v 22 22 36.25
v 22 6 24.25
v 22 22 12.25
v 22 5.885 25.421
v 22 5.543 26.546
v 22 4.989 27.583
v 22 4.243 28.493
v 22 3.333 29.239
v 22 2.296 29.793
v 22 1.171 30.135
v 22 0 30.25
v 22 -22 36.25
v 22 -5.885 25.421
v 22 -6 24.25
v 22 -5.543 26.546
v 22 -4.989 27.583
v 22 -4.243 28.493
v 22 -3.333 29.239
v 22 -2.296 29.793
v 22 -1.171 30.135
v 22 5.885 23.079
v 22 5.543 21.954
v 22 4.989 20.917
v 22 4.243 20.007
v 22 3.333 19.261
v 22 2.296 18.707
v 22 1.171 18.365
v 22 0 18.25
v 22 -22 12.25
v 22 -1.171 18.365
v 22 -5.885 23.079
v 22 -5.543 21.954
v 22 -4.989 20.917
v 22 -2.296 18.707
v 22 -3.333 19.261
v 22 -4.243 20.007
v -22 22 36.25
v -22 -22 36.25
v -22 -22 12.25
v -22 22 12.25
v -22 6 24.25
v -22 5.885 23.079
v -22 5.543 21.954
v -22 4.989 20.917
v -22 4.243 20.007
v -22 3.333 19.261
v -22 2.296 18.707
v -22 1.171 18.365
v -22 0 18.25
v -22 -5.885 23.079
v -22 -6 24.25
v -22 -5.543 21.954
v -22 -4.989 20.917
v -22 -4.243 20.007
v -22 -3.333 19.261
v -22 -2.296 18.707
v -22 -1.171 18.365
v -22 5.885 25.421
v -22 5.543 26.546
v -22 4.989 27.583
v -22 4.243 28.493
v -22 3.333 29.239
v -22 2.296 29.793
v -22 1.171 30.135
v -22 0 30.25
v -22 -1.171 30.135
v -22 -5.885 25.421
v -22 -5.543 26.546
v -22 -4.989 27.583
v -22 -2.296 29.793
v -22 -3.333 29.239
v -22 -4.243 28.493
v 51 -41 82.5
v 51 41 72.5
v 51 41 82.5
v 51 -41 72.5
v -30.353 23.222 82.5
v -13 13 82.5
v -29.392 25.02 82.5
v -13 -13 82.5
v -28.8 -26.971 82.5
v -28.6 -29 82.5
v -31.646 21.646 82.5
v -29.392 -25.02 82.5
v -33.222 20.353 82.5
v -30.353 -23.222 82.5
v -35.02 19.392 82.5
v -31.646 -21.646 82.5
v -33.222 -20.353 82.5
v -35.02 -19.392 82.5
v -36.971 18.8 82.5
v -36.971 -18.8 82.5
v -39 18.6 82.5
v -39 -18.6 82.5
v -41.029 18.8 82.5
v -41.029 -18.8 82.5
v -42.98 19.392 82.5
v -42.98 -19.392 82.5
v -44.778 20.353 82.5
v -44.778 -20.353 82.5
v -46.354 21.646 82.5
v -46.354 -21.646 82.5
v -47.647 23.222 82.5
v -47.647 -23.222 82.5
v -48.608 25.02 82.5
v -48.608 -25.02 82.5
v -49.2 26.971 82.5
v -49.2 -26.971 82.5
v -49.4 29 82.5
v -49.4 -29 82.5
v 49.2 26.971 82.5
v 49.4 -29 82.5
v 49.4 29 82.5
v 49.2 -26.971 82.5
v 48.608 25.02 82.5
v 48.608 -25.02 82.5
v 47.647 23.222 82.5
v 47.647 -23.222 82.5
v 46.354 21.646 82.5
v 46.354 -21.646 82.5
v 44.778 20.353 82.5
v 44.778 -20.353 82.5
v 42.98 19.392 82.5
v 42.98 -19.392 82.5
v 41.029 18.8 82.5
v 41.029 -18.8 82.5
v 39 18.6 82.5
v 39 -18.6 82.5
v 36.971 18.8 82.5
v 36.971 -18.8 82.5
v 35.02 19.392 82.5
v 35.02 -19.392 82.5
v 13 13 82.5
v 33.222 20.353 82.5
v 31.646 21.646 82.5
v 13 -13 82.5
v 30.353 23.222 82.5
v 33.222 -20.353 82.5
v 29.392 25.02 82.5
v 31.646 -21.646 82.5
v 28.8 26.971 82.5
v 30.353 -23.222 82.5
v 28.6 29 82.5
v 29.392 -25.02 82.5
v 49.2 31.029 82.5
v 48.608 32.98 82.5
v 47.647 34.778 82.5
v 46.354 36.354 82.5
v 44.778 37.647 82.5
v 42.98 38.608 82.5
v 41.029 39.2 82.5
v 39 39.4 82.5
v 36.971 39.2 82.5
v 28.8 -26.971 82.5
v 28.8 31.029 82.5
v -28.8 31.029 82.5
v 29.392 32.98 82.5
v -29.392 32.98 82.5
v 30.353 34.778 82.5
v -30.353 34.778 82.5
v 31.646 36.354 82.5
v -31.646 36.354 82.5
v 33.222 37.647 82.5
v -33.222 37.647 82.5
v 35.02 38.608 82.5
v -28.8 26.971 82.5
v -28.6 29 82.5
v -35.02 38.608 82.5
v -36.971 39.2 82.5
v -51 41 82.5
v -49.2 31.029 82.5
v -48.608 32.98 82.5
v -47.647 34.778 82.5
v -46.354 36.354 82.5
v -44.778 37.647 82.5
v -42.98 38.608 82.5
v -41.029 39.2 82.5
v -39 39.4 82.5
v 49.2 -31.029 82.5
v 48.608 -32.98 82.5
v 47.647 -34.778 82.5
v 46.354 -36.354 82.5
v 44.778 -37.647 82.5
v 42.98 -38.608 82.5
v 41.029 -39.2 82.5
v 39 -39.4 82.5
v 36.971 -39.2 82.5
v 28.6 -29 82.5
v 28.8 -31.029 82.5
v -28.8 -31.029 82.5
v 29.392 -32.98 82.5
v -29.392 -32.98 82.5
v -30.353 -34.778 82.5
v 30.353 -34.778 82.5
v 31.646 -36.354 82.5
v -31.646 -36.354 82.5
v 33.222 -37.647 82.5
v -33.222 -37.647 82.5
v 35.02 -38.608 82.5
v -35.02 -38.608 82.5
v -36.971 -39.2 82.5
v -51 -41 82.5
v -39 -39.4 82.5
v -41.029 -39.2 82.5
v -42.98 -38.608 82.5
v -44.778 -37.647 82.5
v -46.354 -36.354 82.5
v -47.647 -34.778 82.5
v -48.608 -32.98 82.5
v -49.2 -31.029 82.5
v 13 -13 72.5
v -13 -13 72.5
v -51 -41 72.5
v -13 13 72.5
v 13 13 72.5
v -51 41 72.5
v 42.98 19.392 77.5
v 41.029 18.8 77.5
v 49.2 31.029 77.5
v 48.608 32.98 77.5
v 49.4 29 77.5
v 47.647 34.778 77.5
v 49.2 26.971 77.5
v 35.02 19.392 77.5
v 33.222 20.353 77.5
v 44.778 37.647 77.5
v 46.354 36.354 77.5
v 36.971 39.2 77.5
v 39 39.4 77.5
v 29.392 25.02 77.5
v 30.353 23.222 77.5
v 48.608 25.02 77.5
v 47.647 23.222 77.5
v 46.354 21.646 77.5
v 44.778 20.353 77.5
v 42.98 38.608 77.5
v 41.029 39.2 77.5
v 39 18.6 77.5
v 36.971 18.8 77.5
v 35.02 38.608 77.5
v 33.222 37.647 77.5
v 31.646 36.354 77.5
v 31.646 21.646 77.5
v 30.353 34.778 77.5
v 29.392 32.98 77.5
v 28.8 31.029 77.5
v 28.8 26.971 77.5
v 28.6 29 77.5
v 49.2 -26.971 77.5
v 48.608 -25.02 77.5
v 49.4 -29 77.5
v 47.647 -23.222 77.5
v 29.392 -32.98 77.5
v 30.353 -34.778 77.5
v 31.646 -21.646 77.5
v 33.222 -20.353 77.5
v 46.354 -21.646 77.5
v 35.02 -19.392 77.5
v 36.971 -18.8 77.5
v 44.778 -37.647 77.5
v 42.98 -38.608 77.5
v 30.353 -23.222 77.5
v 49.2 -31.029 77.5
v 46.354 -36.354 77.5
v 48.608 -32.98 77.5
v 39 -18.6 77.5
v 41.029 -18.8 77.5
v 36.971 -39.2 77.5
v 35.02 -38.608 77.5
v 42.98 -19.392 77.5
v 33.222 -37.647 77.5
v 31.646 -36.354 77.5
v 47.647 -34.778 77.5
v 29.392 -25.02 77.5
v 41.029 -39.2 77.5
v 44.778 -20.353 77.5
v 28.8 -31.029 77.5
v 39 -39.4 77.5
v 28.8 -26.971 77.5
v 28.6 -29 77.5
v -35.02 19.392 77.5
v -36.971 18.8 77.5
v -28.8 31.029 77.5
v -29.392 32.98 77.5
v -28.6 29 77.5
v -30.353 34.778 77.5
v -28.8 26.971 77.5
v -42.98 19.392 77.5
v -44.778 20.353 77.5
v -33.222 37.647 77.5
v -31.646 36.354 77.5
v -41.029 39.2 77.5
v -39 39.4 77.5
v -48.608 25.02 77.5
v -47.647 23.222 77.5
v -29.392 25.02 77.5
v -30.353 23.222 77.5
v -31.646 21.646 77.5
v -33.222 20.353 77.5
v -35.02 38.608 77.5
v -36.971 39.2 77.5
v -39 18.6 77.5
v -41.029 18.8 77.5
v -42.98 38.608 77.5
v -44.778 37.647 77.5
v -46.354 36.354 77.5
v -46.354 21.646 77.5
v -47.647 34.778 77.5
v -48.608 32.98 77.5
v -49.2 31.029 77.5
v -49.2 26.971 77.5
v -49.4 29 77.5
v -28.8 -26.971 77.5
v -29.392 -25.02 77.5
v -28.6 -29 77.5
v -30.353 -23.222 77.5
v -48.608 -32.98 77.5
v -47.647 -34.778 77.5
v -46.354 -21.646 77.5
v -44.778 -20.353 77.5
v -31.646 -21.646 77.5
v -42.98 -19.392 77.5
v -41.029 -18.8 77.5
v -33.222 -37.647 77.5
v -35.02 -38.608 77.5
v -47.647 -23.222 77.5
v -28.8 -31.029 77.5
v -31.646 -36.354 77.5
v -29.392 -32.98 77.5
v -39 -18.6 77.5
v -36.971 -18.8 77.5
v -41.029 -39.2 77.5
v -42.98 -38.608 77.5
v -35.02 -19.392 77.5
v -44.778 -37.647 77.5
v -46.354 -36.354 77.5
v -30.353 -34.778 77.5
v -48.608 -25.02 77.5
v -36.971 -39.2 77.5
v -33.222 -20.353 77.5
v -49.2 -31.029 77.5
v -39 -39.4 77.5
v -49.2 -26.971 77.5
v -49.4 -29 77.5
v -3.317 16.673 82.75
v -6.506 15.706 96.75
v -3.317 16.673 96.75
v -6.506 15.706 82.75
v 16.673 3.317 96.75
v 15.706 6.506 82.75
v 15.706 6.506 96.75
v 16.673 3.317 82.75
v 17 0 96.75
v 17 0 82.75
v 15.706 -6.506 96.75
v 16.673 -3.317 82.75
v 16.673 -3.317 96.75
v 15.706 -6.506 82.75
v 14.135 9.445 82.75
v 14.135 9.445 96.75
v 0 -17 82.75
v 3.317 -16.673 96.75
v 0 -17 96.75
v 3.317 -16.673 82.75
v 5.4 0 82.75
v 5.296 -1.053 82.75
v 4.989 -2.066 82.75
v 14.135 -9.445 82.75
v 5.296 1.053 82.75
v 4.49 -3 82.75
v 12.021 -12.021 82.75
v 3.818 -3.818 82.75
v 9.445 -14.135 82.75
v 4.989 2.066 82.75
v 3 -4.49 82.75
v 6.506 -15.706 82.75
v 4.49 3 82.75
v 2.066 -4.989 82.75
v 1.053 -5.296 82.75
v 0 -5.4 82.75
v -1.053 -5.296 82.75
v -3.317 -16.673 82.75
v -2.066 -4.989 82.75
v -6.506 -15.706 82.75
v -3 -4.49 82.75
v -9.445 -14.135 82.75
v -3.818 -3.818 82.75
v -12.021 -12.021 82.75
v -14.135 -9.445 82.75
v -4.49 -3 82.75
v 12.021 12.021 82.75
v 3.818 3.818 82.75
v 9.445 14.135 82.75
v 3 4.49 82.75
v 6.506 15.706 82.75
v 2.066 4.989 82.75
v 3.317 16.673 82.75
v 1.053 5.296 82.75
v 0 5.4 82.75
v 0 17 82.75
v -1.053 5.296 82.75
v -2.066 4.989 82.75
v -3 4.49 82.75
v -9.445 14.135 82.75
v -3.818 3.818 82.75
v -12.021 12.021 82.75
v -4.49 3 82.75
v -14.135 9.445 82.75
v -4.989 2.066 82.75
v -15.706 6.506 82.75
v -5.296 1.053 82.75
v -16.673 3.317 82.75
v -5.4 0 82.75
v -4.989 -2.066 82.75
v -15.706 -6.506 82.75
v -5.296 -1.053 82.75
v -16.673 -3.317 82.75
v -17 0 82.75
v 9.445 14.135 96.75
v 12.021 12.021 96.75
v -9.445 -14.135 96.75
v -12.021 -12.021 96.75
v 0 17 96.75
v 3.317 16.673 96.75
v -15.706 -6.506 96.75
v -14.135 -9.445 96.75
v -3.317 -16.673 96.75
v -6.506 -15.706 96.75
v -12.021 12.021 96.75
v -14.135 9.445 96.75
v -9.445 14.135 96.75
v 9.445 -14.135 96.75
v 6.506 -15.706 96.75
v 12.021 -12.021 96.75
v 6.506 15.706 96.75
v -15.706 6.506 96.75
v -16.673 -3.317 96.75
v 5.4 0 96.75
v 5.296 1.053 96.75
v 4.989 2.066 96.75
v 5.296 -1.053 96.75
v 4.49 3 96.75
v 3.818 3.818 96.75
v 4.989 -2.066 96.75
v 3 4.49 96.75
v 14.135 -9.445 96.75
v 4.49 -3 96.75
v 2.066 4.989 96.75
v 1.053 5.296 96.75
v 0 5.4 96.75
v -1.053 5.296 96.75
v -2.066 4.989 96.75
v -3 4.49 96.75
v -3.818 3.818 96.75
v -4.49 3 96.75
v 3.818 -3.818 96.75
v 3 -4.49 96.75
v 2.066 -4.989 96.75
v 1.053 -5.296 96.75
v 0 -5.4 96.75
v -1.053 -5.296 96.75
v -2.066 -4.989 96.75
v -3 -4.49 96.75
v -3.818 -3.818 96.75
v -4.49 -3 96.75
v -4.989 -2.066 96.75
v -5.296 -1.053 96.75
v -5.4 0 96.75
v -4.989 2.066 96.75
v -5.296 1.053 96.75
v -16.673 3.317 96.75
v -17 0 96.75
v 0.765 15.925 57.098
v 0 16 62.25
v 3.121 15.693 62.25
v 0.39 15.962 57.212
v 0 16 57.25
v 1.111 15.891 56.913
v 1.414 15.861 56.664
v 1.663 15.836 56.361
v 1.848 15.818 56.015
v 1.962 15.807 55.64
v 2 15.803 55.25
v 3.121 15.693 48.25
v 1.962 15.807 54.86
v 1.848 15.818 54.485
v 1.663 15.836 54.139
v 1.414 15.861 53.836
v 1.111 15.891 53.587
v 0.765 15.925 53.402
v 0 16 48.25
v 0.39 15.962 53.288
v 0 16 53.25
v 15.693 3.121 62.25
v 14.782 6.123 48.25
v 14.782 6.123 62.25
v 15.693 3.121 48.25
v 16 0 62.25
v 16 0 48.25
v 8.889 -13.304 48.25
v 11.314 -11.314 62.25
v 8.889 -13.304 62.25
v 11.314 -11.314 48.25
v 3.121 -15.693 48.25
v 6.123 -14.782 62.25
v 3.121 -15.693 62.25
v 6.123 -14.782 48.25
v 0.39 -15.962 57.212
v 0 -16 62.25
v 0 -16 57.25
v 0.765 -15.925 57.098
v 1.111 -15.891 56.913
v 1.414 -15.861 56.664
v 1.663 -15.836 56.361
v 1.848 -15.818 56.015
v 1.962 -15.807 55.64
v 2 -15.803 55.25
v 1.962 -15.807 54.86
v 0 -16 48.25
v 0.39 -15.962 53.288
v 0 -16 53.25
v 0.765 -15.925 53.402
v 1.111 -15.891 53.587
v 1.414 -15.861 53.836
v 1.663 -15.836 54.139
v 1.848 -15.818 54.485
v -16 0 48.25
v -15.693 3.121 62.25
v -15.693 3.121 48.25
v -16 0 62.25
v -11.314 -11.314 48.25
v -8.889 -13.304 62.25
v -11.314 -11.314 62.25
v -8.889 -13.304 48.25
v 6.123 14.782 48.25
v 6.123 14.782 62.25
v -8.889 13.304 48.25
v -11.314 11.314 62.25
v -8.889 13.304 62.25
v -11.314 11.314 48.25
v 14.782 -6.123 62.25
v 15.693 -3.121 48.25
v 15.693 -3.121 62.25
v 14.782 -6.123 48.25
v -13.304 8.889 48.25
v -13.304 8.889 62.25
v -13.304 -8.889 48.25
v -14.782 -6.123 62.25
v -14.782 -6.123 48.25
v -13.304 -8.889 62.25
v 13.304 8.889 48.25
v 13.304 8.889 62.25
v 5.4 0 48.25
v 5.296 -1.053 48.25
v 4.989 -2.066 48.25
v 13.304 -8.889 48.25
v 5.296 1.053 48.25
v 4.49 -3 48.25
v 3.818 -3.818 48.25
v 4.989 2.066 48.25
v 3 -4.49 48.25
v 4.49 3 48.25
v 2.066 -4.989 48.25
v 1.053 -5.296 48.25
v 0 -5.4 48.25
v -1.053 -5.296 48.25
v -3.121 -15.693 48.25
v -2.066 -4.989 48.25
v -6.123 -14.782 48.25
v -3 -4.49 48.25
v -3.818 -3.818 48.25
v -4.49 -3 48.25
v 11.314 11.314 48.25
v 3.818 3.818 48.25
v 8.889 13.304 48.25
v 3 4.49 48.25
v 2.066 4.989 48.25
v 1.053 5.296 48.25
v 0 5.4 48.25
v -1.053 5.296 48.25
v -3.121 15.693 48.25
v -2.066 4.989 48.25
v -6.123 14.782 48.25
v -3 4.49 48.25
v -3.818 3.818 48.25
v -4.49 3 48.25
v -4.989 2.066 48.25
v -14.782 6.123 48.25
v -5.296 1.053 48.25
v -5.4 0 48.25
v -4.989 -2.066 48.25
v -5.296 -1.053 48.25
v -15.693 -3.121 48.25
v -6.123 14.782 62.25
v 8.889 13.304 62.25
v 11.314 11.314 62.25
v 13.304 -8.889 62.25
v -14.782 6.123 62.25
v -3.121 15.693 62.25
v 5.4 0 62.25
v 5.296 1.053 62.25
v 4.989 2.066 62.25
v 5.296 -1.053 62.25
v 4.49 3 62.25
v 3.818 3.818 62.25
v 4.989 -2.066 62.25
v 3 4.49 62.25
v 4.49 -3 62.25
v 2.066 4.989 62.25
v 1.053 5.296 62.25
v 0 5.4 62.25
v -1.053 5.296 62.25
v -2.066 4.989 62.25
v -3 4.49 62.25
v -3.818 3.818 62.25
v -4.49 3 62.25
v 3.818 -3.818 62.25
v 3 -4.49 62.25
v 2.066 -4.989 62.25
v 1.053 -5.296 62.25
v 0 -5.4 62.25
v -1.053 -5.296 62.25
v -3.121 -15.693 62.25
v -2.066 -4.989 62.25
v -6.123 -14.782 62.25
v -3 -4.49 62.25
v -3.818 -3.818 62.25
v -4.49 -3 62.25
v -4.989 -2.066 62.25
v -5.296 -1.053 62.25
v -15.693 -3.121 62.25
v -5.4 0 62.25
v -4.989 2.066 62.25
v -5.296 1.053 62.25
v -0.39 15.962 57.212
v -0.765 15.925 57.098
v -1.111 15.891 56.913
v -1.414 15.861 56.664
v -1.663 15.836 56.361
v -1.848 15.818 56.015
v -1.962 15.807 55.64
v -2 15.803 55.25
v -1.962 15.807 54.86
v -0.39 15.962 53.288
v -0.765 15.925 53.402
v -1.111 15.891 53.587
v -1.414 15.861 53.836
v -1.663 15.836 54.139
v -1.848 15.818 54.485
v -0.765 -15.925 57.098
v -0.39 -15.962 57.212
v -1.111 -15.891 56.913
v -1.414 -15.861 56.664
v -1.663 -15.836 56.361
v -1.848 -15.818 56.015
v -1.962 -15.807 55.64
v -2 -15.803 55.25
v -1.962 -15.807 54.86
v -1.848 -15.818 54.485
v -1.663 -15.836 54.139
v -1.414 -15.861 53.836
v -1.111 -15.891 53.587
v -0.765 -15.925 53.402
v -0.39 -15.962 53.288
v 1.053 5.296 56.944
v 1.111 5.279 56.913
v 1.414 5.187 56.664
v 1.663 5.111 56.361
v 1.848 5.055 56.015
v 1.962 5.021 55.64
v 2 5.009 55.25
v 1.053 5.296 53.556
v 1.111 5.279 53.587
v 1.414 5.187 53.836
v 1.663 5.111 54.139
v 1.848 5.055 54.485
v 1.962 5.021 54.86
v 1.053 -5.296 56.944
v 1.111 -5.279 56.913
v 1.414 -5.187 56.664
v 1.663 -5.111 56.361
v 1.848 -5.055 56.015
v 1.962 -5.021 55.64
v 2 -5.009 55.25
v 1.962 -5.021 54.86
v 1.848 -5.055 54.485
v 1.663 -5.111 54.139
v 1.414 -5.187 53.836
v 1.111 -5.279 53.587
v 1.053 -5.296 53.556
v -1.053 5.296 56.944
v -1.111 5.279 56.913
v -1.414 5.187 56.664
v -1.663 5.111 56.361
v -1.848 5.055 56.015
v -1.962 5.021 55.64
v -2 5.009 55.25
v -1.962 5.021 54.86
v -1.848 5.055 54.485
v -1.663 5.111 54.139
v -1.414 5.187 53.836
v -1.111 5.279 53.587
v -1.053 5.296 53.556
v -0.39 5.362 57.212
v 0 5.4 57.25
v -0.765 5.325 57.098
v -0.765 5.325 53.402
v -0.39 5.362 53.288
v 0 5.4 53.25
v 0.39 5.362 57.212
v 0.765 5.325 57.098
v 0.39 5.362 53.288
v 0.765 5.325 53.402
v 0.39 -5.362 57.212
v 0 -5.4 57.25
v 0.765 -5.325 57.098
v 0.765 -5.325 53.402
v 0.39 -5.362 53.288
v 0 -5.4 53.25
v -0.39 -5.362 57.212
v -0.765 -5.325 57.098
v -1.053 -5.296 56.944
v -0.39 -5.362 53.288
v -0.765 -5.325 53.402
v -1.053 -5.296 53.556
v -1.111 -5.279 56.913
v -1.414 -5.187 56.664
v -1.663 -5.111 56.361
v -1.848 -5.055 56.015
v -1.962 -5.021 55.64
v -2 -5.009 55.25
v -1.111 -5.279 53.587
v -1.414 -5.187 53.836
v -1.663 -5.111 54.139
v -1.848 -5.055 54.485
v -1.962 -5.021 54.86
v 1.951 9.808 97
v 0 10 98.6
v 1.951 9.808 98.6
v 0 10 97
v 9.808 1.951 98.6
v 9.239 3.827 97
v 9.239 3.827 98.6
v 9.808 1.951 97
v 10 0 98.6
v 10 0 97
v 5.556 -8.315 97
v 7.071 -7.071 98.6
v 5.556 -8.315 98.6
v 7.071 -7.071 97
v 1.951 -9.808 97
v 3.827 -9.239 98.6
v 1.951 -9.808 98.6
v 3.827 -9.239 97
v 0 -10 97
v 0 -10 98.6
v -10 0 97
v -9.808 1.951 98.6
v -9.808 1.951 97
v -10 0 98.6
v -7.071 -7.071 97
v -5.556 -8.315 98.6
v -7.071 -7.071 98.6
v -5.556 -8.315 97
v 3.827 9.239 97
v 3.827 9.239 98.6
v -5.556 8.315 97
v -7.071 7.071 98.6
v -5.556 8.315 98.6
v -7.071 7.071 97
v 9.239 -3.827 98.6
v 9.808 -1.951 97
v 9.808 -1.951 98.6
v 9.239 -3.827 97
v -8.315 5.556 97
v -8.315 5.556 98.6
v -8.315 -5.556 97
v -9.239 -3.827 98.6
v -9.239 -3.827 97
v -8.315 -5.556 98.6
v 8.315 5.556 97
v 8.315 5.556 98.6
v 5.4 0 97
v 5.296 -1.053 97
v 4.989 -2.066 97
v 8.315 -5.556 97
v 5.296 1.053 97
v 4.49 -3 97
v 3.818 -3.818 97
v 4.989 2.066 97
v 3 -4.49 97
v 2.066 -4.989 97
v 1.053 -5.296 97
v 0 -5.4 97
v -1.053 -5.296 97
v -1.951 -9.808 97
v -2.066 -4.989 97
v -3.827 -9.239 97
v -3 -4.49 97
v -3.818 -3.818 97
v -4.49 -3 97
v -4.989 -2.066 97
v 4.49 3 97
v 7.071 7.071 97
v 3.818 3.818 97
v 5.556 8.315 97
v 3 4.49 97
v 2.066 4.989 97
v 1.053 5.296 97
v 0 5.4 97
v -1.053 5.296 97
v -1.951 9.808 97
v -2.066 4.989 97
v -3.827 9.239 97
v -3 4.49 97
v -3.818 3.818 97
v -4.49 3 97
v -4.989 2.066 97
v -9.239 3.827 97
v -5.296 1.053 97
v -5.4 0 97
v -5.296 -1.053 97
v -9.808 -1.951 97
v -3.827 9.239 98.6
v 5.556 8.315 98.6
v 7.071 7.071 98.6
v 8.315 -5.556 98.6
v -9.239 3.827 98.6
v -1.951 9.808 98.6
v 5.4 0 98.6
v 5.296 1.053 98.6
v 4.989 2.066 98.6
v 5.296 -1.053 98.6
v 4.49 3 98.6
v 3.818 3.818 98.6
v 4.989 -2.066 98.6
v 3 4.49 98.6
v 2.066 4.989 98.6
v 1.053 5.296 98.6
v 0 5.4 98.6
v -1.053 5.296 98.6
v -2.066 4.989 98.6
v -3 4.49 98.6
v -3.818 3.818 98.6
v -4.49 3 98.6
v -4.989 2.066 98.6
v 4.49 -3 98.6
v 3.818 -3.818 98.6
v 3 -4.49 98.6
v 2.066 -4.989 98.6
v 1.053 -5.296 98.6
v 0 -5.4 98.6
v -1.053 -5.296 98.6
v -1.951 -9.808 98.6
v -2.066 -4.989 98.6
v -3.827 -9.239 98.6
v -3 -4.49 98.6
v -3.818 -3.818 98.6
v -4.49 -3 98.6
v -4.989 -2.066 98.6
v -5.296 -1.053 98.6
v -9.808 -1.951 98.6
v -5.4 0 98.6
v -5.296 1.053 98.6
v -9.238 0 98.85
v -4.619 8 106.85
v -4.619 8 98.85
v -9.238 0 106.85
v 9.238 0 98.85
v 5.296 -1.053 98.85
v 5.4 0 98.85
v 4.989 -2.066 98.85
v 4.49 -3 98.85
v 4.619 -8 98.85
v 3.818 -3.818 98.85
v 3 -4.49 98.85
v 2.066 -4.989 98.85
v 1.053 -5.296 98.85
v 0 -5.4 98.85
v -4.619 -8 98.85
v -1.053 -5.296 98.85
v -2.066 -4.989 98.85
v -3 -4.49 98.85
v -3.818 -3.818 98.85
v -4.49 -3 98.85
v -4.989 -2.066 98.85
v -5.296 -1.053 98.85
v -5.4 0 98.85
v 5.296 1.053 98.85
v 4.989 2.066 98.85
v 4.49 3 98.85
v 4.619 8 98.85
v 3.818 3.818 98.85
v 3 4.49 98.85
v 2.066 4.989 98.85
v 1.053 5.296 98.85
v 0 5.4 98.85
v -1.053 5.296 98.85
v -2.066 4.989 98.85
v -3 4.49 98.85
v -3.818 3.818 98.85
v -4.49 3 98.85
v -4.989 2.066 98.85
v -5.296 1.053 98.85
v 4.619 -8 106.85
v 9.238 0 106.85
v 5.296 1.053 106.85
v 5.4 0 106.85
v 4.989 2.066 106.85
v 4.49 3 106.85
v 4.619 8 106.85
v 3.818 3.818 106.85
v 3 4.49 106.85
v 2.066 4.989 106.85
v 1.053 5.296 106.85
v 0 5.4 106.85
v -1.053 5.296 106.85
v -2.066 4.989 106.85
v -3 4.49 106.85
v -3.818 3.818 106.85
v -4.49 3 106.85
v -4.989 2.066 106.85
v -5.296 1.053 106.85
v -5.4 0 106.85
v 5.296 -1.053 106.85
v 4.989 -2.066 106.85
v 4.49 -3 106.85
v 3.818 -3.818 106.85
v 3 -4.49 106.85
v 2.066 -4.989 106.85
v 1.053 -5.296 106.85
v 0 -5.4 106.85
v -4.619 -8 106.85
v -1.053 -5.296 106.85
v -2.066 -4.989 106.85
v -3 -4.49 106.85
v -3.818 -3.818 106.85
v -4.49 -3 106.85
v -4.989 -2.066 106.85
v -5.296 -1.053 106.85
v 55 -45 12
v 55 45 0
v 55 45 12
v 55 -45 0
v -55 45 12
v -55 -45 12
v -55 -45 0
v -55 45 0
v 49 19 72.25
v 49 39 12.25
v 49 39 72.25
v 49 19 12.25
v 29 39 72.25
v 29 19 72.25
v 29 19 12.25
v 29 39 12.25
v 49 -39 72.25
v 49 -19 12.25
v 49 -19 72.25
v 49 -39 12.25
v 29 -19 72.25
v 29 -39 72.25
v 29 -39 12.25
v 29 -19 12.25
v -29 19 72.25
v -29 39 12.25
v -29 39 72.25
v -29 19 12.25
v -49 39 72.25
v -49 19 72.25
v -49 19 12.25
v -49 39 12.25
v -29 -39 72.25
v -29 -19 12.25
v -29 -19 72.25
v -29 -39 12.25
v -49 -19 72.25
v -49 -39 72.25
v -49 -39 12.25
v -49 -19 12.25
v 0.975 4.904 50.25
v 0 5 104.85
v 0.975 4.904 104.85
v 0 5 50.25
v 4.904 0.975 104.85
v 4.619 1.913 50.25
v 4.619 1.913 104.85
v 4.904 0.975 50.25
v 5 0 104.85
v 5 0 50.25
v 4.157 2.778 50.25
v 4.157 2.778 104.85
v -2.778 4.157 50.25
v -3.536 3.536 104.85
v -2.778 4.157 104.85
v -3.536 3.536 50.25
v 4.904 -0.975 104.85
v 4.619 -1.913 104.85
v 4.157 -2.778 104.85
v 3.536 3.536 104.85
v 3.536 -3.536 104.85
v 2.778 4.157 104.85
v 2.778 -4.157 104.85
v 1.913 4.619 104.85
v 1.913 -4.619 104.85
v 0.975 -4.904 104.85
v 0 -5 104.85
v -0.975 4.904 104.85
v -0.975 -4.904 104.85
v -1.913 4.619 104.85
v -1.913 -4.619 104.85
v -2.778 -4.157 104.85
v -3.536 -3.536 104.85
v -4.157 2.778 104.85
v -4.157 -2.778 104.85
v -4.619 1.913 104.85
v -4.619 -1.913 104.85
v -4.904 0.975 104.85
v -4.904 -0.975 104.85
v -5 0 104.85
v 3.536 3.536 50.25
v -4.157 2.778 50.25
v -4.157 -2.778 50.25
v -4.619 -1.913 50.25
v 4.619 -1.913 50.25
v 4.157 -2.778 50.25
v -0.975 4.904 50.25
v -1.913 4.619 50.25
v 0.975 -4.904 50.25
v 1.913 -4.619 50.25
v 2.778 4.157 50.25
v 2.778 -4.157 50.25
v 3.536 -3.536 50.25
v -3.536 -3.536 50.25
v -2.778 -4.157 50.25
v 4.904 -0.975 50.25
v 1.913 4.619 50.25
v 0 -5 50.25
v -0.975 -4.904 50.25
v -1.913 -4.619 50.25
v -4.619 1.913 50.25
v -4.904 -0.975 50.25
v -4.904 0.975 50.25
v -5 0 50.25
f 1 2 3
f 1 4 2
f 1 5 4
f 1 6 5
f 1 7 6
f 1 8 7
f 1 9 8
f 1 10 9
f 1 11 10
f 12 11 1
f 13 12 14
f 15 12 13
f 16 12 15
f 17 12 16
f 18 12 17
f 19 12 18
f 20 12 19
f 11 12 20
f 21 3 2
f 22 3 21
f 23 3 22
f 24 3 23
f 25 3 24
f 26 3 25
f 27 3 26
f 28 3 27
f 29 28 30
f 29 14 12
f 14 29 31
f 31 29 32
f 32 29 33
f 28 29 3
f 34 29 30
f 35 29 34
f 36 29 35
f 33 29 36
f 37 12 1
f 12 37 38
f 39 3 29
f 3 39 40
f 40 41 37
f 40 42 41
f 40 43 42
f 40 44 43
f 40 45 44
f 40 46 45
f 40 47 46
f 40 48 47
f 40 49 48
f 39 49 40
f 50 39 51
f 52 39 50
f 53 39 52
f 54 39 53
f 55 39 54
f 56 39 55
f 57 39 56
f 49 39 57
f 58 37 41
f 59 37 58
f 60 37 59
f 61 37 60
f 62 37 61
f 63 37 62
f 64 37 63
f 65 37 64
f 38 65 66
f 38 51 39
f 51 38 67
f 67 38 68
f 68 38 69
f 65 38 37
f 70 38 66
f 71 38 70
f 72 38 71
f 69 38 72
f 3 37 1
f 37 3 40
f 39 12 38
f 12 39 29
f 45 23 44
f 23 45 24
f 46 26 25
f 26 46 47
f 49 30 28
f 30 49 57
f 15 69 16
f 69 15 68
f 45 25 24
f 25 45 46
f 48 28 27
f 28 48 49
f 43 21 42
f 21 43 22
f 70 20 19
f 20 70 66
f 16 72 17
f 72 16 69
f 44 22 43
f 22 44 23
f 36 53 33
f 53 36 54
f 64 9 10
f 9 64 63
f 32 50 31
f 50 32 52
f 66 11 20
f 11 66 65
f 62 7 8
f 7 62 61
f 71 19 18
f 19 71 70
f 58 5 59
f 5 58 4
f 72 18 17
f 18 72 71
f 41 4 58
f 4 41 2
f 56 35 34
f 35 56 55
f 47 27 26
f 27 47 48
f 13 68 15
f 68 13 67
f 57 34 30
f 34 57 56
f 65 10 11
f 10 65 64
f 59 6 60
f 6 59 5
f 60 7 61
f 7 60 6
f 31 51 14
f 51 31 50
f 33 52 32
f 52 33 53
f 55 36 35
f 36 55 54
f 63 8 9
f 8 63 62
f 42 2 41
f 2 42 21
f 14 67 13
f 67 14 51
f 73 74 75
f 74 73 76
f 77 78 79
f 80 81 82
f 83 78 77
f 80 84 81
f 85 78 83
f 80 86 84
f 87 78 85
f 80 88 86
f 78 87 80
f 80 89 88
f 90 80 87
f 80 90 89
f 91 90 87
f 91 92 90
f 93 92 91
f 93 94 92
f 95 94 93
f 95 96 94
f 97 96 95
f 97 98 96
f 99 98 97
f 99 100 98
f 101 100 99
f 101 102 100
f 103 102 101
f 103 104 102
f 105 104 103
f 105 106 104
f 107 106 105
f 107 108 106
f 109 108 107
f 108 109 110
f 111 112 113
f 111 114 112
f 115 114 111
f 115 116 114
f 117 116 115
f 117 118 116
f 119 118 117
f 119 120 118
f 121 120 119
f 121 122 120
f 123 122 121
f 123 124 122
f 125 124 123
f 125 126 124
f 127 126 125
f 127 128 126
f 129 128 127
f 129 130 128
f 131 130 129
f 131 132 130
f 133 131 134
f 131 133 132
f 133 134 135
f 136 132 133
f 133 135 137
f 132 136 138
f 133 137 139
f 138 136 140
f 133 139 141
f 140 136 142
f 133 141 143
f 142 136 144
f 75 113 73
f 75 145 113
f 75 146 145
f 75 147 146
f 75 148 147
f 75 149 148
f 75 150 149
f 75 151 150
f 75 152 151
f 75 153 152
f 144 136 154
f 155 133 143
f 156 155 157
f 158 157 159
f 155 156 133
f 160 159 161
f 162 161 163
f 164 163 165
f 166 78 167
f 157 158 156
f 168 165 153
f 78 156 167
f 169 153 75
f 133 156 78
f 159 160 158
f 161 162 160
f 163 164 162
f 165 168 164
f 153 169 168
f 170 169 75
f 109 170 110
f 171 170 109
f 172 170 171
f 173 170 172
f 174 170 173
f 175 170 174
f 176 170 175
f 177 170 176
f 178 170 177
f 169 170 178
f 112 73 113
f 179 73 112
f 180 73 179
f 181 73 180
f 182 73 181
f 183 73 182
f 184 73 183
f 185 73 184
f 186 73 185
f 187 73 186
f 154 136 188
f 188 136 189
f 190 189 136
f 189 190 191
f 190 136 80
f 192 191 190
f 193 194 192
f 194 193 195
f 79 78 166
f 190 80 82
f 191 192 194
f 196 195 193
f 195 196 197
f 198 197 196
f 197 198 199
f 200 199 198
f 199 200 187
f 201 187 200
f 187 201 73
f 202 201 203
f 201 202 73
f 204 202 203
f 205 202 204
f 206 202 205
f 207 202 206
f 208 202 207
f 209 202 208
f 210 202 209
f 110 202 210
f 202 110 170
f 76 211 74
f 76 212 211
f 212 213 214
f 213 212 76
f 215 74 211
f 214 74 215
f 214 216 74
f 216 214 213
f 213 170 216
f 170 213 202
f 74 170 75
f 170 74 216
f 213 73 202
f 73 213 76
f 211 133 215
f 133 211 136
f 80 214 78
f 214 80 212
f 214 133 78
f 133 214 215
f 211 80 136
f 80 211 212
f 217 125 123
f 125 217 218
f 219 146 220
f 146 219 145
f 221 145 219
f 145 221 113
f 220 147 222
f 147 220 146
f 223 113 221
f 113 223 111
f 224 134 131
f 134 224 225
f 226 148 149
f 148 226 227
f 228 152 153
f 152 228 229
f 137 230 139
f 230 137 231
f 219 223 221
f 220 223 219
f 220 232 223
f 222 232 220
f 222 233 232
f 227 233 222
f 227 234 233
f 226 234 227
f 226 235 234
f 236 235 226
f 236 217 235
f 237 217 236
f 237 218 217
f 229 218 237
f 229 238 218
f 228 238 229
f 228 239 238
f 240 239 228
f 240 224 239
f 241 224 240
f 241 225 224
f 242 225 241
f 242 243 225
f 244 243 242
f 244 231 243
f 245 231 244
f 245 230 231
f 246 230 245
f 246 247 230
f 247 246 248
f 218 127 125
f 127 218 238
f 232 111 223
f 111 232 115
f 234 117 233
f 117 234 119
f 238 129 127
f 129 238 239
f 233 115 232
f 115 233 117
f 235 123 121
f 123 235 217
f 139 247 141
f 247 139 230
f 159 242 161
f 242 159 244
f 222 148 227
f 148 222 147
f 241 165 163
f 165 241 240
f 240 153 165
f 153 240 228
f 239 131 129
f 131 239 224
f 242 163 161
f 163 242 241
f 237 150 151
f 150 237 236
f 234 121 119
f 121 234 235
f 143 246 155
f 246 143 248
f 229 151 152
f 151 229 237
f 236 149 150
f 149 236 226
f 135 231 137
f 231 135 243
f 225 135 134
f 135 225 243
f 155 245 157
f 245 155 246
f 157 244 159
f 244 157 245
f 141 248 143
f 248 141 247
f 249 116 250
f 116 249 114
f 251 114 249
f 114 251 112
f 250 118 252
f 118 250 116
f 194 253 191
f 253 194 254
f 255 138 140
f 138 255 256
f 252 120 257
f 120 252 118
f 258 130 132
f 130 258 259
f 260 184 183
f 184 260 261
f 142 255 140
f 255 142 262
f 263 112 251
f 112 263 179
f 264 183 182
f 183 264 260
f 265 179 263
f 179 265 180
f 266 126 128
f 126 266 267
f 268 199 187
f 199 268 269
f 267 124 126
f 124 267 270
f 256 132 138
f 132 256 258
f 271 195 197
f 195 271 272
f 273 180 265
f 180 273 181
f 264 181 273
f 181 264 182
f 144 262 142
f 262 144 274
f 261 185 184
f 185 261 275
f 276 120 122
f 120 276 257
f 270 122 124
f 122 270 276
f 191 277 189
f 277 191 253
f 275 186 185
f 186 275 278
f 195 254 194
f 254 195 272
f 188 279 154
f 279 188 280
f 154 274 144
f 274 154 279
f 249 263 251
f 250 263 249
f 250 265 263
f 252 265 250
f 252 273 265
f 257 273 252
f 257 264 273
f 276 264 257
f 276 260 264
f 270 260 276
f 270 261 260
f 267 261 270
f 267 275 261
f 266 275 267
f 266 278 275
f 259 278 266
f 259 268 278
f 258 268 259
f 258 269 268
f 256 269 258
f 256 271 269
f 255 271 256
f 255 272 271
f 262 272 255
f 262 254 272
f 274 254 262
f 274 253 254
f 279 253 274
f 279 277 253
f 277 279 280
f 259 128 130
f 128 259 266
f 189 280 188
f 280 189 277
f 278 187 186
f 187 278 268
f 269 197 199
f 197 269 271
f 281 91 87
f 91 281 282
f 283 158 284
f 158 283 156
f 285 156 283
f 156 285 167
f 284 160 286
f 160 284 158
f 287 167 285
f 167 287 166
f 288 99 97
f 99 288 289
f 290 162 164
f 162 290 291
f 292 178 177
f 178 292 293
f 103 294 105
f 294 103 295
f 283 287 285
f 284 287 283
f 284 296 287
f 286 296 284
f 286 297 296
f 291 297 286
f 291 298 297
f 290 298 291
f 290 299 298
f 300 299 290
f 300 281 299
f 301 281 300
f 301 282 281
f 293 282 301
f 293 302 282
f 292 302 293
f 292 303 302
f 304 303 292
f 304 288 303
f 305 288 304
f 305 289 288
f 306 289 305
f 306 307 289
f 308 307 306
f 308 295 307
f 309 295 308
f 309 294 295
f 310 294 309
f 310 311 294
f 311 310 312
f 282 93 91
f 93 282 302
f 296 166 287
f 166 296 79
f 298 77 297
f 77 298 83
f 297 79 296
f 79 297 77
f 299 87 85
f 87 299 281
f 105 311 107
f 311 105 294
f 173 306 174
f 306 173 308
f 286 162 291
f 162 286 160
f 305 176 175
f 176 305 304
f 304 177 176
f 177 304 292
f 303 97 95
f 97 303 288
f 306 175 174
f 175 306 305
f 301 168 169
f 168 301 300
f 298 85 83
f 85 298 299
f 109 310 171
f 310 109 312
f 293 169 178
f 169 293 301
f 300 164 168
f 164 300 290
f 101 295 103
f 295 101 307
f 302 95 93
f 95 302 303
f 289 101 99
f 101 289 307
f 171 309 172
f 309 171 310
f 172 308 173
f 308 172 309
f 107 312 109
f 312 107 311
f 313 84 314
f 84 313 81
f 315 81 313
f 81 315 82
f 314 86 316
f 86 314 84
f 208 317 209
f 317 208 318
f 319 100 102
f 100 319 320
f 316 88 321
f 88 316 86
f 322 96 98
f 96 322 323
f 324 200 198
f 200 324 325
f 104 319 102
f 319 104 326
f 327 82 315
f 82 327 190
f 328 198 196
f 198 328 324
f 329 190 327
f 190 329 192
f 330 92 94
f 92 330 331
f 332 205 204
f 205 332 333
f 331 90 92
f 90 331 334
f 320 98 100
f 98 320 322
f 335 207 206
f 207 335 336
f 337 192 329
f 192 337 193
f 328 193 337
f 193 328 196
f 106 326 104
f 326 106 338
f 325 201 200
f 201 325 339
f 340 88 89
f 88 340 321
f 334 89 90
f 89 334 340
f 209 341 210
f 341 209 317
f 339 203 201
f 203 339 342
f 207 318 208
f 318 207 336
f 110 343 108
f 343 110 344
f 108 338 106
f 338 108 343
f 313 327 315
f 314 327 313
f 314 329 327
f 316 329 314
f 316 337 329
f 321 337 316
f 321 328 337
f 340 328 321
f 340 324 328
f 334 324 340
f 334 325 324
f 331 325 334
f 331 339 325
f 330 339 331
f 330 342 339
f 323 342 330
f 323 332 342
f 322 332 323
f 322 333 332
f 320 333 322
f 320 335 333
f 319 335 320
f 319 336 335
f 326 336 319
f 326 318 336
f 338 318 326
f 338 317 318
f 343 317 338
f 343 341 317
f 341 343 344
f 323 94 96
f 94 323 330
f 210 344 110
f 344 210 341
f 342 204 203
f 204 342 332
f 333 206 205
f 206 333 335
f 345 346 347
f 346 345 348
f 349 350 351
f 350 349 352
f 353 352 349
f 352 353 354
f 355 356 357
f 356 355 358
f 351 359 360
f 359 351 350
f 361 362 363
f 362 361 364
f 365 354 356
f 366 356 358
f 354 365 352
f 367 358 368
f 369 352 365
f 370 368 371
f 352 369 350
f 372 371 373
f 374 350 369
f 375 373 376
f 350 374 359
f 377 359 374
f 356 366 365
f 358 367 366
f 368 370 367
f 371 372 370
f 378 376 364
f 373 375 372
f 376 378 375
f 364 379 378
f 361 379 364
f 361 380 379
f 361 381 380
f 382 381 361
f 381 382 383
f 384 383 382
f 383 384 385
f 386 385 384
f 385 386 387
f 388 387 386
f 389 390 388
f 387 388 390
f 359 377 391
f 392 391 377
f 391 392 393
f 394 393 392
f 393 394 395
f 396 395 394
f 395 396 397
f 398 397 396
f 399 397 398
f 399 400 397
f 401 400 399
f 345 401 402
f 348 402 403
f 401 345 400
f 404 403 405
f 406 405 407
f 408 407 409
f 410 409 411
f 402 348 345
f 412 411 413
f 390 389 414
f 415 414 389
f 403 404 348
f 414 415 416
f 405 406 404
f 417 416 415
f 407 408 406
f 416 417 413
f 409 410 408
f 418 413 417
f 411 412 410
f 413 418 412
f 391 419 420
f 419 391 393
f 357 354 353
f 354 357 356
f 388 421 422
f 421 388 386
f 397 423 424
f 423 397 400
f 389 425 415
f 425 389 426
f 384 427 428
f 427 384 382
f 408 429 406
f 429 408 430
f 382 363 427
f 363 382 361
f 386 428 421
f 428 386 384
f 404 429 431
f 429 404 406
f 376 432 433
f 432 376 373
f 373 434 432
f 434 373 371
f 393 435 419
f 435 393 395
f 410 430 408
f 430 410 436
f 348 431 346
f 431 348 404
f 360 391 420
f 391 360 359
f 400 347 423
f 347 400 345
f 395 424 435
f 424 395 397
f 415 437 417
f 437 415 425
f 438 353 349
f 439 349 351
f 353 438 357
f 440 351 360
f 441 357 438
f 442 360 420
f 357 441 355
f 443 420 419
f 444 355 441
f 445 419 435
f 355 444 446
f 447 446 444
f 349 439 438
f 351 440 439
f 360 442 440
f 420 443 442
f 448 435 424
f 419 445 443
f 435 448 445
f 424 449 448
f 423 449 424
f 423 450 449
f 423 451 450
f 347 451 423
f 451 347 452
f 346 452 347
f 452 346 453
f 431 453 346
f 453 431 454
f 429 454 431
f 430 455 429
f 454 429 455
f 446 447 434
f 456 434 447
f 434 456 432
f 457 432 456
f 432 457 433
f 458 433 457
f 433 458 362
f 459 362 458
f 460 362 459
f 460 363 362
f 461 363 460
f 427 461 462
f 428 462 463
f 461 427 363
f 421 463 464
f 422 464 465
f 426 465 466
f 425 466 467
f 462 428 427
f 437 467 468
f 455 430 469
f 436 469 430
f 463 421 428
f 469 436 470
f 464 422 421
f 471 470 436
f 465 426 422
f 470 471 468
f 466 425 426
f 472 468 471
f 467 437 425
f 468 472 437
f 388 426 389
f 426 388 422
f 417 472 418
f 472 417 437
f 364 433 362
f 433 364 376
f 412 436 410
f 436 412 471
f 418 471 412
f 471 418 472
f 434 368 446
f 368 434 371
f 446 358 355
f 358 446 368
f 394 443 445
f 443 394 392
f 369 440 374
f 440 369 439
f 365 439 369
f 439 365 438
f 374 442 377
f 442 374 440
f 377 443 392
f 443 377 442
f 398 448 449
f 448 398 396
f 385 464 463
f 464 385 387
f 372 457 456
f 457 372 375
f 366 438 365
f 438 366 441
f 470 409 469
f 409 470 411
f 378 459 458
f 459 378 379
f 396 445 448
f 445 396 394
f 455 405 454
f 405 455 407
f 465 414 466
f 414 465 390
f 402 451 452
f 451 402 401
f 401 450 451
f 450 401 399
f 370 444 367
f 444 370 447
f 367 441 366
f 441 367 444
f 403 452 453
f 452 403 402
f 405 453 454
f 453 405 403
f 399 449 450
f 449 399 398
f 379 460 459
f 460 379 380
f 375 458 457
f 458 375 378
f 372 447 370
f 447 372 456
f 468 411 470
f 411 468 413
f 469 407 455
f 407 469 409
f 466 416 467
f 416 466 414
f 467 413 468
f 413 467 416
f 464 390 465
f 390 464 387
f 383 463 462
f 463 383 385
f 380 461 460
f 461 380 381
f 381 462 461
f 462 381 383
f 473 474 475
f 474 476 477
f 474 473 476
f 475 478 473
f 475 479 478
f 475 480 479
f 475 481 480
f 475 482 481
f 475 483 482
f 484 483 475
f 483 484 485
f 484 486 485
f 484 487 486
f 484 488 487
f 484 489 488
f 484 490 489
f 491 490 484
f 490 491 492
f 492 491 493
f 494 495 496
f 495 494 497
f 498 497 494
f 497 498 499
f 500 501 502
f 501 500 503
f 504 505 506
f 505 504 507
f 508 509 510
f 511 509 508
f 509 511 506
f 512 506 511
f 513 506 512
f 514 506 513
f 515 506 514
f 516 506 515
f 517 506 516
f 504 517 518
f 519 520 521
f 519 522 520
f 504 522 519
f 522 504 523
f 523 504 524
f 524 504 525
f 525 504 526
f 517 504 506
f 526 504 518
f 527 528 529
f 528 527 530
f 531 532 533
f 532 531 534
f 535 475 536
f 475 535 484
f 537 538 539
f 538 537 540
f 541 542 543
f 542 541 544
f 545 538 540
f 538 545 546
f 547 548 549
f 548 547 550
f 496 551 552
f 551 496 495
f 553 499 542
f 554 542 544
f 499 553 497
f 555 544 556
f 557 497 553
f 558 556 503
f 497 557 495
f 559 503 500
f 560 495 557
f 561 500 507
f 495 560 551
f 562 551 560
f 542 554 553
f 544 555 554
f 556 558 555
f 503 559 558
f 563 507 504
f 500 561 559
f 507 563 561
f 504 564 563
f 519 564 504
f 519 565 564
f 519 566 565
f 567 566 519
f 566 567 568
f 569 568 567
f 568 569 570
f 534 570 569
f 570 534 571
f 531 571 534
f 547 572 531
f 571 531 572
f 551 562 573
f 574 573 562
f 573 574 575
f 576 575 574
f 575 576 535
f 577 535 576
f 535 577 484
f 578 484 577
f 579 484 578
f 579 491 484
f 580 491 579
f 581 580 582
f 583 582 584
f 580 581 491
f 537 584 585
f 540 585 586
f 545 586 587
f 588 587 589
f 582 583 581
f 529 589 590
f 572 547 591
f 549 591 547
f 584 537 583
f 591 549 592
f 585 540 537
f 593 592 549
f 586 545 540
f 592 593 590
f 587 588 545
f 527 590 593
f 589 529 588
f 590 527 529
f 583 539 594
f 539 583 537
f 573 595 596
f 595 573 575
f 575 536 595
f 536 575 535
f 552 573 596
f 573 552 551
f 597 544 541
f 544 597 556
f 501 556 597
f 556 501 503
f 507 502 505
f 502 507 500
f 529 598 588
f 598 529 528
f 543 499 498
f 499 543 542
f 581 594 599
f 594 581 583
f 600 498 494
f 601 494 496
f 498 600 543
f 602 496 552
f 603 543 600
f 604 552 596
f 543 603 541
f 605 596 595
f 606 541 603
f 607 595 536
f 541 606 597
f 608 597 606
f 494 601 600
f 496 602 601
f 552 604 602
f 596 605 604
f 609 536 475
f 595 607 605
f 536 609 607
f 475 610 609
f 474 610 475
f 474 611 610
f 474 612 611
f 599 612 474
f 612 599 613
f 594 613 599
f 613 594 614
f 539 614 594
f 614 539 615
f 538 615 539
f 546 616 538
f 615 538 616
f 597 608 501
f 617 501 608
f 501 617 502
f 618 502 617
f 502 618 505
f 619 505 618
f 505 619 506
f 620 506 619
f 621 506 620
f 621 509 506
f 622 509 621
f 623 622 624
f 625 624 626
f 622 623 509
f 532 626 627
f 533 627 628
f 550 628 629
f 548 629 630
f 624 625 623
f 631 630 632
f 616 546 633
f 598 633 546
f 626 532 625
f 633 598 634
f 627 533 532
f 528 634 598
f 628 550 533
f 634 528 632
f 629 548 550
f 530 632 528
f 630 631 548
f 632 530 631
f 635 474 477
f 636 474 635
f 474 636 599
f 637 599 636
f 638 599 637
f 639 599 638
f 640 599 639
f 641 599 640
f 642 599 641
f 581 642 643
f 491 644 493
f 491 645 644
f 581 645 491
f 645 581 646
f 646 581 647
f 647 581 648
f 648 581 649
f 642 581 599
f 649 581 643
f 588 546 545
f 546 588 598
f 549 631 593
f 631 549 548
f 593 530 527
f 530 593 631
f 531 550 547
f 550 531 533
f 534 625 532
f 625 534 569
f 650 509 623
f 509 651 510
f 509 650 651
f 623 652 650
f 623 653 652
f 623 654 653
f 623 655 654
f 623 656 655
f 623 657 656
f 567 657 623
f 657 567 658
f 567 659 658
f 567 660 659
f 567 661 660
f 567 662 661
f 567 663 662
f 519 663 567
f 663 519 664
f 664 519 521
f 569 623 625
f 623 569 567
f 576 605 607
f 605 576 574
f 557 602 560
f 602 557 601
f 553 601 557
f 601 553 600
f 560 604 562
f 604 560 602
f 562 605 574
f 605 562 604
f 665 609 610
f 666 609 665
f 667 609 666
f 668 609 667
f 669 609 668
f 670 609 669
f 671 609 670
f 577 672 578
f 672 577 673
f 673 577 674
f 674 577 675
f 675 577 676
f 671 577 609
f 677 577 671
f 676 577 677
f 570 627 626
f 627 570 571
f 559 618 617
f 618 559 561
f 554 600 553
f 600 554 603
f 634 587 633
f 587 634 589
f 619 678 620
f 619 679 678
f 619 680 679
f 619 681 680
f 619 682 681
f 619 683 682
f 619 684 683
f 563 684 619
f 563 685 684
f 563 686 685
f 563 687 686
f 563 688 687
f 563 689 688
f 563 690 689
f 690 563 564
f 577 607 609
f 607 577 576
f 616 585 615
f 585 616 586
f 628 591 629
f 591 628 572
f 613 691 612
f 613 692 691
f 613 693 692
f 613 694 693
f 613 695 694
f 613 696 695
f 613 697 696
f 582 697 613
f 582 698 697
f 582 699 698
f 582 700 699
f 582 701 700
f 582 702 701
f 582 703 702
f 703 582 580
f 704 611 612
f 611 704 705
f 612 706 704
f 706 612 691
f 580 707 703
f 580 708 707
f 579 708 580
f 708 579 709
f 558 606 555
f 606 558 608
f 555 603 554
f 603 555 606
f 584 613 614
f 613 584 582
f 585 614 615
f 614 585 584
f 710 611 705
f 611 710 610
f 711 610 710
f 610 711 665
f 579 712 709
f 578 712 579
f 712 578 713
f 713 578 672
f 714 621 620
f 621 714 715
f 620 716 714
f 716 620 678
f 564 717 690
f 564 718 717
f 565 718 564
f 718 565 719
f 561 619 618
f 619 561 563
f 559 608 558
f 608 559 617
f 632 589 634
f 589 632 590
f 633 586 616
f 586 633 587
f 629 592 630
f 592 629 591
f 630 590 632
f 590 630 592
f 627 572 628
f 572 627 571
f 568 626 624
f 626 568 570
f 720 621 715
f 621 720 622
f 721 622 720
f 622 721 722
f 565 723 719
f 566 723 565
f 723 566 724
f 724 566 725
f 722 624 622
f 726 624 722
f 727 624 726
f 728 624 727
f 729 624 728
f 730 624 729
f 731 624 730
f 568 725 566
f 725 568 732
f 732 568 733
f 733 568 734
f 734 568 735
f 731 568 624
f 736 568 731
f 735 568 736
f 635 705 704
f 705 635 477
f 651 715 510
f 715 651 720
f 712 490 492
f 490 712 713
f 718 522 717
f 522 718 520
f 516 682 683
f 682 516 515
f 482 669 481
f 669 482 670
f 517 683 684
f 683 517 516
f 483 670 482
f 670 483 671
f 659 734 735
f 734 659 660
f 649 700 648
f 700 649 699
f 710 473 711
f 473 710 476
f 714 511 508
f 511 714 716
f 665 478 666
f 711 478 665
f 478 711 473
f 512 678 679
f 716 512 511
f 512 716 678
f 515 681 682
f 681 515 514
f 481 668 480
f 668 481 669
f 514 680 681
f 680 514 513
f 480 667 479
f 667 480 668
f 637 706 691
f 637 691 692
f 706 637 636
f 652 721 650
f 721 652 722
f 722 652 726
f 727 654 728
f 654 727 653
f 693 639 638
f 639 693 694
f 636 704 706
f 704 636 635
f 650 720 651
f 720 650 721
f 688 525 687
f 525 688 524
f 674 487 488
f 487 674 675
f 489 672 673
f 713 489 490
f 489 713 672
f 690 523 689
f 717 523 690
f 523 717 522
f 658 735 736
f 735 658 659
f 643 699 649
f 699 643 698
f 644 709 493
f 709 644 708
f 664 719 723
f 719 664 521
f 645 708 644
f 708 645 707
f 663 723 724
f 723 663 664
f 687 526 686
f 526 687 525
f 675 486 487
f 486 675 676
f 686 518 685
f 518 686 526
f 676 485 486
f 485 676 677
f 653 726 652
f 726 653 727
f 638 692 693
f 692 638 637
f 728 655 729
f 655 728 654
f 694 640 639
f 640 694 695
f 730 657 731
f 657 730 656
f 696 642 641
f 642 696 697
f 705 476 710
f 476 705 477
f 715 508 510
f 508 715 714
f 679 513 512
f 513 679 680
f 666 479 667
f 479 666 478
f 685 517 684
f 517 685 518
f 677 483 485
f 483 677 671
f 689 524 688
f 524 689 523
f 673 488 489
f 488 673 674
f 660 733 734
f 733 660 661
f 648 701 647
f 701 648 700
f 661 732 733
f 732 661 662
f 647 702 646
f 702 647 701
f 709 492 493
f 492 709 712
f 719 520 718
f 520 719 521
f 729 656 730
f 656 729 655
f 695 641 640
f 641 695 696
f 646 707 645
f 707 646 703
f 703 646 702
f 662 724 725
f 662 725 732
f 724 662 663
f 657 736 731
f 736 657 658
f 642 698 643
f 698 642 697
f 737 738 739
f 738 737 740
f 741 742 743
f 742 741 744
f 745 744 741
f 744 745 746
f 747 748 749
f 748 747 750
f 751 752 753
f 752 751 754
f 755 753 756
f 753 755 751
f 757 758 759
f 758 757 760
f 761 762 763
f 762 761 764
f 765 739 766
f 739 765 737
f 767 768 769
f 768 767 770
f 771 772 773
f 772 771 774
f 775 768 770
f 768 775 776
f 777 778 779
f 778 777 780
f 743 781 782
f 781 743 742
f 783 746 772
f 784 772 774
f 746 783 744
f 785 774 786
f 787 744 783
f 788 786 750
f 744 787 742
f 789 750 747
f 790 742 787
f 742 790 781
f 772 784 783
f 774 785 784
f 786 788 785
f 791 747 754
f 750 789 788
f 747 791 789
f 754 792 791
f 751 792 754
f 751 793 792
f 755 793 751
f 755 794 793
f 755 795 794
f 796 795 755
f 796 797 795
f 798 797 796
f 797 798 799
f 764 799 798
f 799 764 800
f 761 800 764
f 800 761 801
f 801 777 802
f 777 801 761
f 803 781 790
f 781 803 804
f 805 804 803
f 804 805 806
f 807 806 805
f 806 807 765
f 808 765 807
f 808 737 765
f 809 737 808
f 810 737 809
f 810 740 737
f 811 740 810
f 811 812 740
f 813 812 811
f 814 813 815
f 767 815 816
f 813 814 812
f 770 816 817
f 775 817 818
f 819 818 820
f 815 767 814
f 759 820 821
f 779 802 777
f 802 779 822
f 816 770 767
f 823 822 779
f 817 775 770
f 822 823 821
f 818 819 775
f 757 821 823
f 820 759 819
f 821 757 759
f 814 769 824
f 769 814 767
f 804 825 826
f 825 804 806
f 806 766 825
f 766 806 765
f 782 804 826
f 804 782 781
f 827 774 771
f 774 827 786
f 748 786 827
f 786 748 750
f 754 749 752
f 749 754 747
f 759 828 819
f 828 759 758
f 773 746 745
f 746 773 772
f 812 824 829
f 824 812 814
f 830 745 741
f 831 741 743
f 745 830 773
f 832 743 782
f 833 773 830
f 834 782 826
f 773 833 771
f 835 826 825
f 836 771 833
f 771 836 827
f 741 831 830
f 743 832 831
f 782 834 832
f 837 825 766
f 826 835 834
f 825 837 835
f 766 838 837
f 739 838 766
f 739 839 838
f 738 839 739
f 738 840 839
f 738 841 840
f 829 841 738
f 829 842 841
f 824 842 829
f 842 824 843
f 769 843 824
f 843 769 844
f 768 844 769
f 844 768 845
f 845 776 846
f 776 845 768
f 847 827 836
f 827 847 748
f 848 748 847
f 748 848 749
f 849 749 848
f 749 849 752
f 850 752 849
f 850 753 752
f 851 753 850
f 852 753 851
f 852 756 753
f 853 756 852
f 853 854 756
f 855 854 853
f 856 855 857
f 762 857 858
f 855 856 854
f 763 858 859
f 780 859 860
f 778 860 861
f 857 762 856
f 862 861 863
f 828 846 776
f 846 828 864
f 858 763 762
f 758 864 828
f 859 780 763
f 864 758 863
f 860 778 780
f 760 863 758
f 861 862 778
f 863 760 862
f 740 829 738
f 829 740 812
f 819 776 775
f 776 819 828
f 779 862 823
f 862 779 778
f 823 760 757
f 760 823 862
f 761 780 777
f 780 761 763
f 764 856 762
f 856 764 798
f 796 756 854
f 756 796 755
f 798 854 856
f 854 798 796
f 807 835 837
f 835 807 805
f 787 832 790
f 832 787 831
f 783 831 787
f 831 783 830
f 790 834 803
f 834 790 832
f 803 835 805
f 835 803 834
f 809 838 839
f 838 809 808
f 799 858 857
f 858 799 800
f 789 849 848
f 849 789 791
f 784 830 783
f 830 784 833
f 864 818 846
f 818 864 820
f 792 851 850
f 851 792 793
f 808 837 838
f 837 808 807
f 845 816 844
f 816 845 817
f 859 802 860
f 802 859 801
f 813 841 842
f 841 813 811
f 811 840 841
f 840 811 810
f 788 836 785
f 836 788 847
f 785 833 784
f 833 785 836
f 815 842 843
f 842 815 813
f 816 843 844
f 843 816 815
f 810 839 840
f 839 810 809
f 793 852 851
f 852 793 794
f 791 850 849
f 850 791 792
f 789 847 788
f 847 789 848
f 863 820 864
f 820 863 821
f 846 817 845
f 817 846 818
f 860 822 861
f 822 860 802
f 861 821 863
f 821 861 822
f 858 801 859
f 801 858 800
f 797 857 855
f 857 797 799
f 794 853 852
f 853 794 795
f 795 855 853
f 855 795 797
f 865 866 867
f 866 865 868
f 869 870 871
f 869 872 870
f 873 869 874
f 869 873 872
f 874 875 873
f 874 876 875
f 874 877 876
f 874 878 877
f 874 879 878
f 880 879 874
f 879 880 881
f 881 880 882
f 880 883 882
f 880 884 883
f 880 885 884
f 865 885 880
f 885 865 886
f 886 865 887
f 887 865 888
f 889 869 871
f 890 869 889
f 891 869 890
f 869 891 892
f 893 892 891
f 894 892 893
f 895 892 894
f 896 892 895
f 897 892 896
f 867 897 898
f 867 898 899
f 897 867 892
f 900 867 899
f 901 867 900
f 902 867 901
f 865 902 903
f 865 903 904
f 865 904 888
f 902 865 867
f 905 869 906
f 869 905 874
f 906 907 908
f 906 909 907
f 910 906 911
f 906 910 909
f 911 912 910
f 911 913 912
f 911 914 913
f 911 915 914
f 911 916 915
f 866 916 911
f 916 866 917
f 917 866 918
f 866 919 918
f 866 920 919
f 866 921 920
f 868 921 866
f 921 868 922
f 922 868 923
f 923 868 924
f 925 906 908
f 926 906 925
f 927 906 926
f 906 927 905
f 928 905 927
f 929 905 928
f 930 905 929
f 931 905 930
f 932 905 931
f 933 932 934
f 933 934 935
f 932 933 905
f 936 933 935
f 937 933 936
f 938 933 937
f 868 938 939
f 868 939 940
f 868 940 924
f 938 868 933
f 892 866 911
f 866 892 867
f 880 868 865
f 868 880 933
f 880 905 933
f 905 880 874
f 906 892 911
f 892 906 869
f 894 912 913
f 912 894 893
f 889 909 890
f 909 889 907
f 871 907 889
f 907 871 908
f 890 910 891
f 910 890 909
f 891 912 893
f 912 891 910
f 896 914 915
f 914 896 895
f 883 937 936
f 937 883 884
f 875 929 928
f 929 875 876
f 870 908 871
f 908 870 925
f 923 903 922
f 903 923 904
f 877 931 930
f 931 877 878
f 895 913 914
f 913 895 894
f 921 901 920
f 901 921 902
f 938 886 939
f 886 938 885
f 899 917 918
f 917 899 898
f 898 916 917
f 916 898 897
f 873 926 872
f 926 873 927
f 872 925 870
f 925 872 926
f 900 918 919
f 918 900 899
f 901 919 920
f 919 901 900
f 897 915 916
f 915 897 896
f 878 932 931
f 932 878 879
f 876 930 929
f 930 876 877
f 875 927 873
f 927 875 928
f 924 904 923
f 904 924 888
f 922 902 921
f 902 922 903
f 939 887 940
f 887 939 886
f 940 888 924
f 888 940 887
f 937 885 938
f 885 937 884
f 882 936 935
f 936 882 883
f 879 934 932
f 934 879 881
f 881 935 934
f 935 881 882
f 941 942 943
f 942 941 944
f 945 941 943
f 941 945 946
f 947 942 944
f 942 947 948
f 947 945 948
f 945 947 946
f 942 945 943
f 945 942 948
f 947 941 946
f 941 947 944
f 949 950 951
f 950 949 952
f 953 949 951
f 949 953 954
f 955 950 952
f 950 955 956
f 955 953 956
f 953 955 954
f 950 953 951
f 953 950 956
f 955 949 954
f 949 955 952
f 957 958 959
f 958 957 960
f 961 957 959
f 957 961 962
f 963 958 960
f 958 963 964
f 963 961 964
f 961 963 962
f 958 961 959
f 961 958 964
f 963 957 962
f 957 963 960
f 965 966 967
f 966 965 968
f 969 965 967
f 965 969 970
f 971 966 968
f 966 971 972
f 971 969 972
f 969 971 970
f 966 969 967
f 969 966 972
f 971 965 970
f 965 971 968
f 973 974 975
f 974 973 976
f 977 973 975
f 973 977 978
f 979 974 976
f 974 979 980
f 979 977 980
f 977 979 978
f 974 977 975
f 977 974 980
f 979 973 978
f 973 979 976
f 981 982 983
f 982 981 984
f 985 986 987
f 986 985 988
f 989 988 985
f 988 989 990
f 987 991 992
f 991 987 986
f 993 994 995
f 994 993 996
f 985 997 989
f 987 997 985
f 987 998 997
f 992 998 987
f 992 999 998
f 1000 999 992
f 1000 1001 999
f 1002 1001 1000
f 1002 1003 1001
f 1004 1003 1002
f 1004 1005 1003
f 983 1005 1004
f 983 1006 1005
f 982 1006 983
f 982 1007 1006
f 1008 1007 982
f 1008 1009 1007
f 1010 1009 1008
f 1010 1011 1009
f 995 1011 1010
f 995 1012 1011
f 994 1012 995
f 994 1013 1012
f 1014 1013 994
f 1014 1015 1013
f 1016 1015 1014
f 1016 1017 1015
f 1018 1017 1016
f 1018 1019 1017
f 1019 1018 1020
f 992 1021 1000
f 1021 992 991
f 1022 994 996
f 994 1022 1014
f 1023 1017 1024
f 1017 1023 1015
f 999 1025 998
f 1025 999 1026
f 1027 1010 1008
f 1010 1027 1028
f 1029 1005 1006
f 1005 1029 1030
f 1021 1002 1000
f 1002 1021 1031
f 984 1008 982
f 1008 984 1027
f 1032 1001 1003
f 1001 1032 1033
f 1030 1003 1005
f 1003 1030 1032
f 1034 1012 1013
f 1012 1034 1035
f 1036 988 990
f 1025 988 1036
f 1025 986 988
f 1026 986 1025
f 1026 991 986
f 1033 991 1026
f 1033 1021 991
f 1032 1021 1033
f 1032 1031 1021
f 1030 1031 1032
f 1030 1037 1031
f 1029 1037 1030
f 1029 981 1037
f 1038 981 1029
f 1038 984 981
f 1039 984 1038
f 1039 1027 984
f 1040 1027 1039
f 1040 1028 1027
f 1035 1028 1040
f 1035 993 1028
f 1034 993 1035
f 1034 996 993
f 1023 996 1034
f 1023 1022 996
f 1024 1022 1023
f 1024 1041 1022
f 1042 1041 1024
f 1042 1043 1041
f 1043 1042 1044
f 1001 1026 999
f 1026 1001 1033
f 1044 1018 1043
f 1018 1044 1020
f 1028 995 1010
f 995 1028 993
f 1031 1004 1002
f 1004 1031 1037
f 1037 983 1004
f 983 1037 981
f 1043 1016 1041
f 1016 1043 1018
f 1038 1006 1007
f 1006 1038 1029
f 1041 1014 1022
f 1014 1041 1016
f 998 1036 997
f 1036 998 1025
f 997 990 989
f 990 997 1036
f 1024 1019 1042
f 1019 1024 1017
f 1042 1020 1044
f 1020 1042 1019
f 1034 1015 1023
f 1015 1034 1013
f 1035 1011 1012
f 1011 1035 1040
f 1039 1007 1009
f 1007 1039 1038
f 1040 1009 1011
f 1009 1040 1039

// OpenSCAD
$fn = 32;

// ------------------------------------------------------------------------
// Arbor press fixture: screw d10, posts 60 mm, gap 12 mm
// Every part is its own module, assembly() places every instance.
// ------------------------------------------------------------------------

// --- part 1 ---
module press_bed() {
  difference() {
    translate([-55, -45, 0]) cube([110, 90, 12]);
  }
}

// --- part 2 ---
module anvil_block() {
  difference() {
    translate([-22, -22, 0]) cube([44, 44, 24]);
    translate([0, 0, 12]) rotate([0, 90, 0]) cylinder(h = 46, d = 12, center = true);
  }
}

// --- part 3 ---
module press_post_a() {
  translate([-10, -10, 0]) cube([20, 20, 60]);
}

// --- part 4 ---
module press_post_b() {
  translate([-10, -10, 0]) cube([20, 20, 60]);
}

// --- part 5 ---
module press_post_c() {
  translate([-10, -10, 0]) cube([20, 20, 60]);
}

// --- part 6 ---
module press_post_d() {
  translate([-10, -10, 0]) cube([20, 20, 60]);
}

// --- part 7 ---
module press_frame() {
  difference() {
    translate([-51, -41, 0]) cube([102, 82, 10]);
    translate([-13, -13, -1]) cube([26, 26, 12]);
    translate([39, 29, 5]) cylinder(h = 6, d = 20.8);
    translate([39, -29, 5]) cylinder(h = 6, d = 20.8);
    translate([-39, 29, 5]) cylinder(h = 6, d = 20.8);
    translate([-39, -29, 5]) cylinder(h = 6, d = 20.8);
  }
}

// --- part 8 ---
module guide_ring() {
  difference() {
      translate([0, 0, 0]) cylinder(h = 14, d = 34);
      translate([0, 0, -1]) cylinder(h = 16, d = 10.8);
    }
}

// --- part 9 ---
module press_screw() {
  translate([0, 0, -27.3]) cylinder(h = 54.6, d = 10);
}

// --- part 10 ---
module press_head() {
  difference() {
    cylinder(h = 14, d = 32);
    translate([0, 0, -1]) cylinder(h = 16, d = 10.8);
    translate([0, 0, 7]) rotate([90, 0, 0]) cylinder(h = 34, d = 4, center = true);
  }
}

// --- part 11 ---
module nut_washer() {
  difference() {
      translate([0, 0, 0]) cylinder(h = 1.6, d = 20);
      translate([0, 0, -1]) cylinder(h = 3.6, d = 10.8);
    }
}

// --- part 12 ---
module press_nut() {
  difference() {
    linear_extrude(height = 8) polygon(points = [[9.238, 0], [4.619, 8], [-4.619, 8], [-9.238, 0], [-4.619, -8], [4.619, -8]]);
    translate([0, 0, -1]) cylinder(h = 10, d = 10.8);
  }
}

// --- assembly ---
module assembly() {
  color([0.80, 0.24, 0.20]) translate([0, 0, 0]) rotate([0, 0, 0]) press_bed();
  color([0.20, 0.45, 0.75]) translate([0, 0, 12.25]) rotate([0, 0, 0]) anvil_block();
  color([0.25, 0.62, 0.32]) translate([39, 29, 12.25]) rotate([0, 0, 0]) press_post_a();
  color([0.92, 0.70, 0.18]) translate([39, -29, 12.25]) rotate([0, 0, 0]) press_post_b();
  color([0.58, 0.35, 0.70]) translate([-39, 29, 12.25]) rotate([0, 0, 0]) press_post_c();
  color([0.16, 0.66, 0.66]) translate([-39, -29, 12.25]) rotate([0, 0, 0]) press_post_d();
  color([0.85, 0.48, 0.18]) translate([0, 0, 72.5]) rotate([0, 0, 0]) press_frame();
  color([0.55, 0.60, 0.65]) translate([0, 0, 82.75]) rotate([0, 0, 0]) guide_ring();
  color([0.75, 0.30, 0.55]) translate([0, 0, 77.55]) rotate([0, 0, 0]) press_screw();
  color([0.42, 0.52, 0.28]) translate([0, 0, 48.25]) rotate([0, 0, 0]) press_head();
  color([0.80, 0.24, 0.20]) translate([0, 0, 97]) rotate([0, 0, 0]) nut_washer();
  color([0.20, 0.45, 0.75]) translate([0, 0, 98.85]) rotate([0, 0, 0]) press_nut();
}

assembly();
